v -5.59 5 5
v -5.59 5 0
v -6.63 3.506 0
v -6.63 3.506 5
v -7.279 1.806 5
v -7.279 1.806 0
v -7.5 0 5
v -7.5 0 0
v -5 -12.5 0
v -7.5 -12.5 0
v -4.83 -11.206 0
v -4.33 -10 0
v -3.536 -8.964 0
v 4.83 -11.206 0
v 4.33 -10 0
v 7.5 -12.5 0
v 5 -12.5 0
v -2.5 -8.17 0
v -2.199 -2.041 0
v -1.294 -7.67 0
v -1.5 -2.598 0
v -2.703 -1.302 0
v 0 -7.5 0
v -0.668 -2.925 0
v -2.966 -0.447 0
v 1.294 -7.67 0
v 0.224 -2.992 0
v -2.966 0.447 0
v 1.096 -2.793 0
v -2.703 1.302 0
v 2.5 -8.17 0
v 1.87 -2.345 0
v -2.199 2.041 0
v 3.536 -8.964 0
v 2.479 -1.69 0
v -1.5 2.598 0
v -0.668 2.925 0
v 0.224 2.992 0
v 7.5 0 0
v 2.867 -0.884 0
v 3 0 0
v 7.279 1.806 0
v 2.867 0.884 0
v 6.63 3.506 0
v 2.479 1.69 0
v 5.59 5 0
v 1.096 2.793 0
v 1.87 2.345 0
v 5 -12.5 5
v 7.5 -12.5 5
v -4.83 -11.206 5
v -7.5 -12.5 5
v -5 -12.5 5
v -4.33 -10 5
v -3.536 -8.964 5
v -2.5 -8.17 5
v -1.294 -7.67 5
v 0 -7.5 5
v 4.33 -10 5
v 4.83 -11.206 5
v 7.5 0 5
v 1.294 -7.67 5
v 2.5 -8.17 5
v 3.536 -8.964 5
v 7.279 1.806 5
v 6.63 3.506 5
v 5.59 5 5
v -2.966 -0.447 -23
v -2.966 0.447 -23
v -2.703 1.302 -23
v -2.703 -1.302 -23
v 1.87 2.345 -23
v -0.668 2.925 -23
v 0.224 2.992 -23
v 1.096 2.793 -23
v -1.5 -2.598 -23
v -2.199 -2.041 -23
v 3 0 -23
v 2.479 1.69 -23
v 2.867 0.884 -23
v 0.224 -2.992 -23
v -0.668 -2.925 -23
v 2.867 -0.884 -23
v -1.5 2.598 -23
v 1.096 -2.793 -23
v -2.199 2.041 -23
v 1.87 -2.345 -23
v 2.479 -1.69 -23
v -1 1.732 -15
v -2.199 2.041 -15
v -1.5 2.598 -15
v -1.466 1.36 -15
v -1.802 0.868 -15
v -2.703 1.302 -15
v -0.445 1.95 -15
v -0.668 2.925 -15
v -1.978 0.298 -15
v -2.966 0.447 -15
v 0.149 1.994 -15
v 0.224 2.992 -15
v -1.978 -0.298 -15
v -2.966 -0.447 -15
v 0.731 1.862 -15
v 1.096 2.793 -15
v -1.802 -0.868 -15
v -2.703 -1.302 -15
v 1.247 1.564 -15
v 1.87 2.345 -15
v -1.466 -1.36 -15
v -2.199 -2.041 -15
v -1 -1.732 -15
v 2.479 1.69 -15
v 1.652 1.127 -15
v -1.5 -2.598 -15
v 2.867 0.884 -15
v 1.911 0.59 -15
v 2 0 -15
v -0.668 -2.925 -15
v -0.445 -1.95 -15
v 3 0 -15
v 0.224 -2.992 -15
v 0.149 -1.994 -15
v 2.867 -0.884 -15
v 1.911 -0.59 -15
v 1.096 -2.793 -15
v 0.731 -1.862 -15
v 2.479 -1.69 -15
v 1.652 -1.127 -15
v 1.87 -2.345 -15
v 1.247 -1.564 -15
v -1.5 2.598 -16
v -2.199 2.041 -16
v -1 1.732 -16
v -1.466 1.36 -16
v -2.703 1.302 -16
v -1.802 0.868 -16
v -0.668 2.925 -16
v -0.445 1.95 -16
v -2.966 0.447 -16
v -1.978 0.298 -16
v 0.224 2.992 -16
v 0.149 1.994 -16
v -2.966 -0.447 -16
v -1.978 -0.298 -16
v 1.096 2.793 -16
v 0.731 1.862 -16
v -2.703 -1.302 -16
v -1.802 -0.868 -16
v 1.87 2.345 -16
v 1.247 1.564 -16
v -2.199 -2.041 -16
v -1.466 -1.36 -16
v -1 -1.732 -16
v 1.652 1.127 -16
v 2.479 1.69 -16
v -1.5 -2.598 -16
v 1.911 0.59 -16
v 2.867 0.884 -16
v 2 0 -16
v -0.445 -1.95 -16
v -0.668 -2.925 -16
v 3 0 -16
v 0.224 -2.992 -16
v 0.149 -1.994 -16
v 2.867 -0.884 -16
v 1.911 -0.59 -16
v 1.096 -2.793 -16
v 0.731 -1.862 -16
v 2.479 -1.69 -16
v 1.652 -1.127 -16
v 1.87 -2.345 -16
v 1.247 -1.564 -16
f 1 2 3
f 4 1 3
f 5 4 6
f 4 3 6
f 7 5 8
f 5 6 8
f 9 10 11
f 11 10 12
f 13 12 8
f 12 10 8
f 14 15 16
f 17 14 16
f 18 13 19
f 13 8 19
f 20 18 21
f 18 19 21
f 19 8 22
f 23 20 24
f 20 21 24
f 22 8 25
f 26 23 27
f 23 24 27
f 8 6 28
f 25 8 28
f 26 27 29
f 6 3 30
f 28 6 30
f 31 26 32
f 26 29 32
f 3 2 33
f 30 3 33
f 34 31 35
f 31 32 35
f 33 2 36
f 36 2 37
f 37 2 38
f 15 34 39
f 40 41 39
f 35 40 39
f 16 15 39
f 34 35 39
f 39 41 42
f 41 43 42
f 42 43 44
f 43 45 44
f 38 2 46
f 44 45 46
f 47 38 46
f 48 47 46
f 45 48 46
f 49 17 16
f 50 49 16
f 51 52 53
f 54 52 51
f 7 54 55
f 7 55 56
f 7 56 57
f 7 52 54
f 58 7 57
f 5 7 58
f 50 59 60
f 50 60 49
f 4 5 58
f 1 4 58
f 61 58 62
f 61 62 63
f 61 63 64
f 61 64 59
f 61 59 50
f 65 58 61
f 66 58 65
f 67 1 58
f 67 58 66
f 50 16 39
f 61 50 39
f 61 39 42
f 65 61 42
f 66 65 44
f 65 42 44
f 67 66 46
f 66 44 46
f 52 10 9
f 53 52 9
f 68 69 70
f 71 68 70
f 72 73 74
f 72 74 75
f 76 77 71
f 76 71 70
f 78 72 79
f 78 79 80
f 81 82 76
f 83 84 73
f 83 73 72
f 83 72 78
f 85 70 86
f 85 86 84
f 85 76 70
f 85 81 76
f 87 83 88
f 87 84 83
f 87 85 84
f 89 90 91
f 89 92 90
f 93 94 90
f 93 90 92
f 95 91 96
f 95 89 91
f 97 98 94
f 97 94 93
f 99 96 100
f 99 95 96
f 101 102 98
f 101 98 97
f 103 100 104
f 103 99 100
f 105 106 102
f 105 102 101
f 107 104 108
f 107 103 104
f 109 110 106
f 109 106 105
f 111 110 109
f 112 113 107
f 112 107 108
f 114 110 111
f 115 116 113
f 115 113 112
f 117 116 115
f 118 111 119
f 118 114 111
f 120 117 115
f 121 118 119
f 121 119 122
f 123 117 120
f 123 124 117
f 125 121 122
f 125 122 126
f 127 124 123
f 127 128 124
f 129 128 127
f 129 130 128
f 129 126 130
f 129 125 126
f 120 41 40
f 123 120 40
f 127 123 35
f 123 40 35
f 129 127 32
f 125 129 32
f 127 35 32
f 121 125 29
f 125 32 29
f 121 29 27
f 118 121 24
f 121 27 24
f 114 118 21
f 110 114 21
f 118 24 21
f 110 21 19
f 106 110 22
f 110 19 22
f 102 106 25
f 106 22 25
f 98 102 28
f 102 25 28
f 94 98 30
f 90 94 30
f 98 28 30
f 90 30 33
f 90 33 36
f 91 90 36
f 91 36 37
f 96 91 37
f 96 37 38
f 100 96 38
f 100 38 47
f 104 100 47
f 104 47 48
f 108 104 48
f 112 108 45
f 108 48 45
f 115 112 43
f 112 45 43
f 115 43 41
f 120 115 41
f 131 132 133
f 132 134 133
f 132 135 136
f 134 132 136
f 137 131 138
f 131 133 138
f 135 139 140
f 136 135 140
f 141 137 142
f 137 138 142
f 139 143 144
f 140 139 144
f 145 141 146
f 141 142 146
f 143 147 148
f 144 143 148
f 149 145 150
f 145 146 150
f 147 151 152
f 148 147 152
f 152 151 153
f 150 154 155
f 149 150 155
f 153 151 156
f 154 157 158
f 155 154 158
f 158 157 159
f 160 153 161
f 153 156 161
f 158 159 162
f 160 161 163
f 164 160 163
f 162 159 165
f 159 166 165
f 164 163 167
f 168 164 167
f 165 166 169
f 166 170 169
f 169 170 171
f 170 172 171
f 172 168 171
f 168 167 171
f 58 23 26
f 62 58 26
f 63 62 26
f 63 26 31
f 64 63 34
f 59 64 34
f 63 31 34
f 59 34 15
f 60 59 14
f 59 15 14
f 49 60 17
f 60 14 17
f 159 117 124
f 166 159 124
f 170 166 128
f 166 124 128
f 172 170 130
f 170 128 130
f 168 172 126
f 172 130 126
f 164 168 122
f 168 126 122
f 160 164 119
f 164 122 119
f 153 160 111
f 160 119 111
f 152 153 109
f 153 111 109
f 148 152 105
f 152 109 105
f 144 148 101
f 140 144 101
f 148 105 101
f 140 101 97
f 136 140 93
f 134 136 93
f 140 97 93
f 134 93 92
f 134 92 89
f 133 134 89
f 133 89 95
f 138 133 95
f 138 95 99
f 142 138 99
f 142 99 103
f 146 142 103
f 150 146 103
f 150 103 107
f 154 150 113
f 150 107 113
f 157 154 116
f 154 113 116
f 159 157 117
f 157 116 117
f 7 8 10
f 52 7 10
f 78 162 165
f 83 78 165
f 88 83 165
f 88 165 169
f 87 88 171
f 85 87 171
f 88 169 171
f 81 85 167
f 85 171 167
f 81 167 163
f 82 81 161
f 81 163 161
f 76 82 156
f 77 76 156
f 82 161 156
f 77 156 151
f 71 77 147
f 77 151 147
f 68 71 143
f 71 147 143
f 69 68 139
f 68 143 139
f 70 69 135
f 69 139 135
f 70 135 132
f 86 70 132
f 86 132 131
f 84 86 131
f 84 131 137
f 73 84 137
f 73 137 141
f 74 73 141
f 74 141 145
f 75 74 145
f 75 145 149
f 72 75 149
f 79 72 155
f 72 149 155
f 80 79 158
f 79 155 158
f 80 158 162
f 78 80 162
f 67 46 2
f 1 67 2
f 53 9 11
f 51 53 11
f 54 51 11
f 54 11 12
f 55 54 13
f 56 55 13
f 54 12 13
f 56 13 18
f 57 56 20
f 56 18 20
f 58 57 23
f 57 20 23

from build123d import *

# Parameters (mm, degrees)
F1_DEPTH = 5
F2_R     = 3
F3_DEPTH = 15
F4_R     = 2
F5_DEPTH = 1
F6_R     = 3
F6_R_2   = 2
F7_DEPTH = 7


with BuildPart() as f1:
    # F0 (on Top) → F1 (new body)
    with BuildSketch(Plane.XY):
        with BuildLine():
            ThreePointArc((0, -7.5), (5.3033008589, -5.3033008589), (7.5, 0))
            ThreePointArc((7.5, 0), (7.0062926922, 2.6761656733), (5.5901699437, 5))
            Line((5.5901699437, 5), (-5.5901699437, 5))
            ThreePointArc((-5.5901699437, 5), (-7.0062926922, 2.6761656733), (-7.5, 0))
            ThreePointArc((-7.5, 0), (-5.3033008589, -5.3033008589), (0, -7.5))
        make_face()
        with BuildLine():
            Line((7.5, -7.5), (7.5, 0))
            ThreePointArc((7.5, 0), (5.3033008589, -5.3033008589), (0, -7.5))
            Line((0, -7.5), (7.5, -7.5))
        make_face()
        with BuildLine():
            Line((-7.5, -7.5), (0, -7.5))
            ThreePointArc((0, -7.5), (-5.3033008589, -5.3033008589), (-7.5, 0))
            Line((-7.5, 0), (-7.5, -7.5))
        make_face()
        with BuildLine():
            Line((7.5, -7.5), (0, -7.5))
            ThreePointArc((0, -7.5), (3.5355339059, -8.9644660941), (5, -12.5))
            Line((5, -12.5), (7.5, -12.5))
            Line((7.5, -12.5), (7.5, -7.5))
        make_face()
        with BuildLine():
            ThreePointArc((-5, -12.5), (-3.5355339059, -8.9644660941), (0, -7.5))
            Line((0, -7.5), (-7.5, -7.5))
            Line((-7.5, -7.5), (-7.5, -12.5))
            Line((-7.5, -12.5), (-5, -12.5))
        make_face()
    extrude(amount=F1_DEPTH)

    # F2 (on face) → F3 (join)
    with BuildSketch(Plane(origin=(0, 0, 0), x_dir=(1, 0, 0), z_dir=(0, 0, -1))):
        Circle(F2_R)
    extrude(amount=F3_DEPTH)

    # F4 (on face) → F5 (join)
    with BuildSketch(Plane(origin=(0, 0, -15), x_dir=(1, 0, 0), z_dir=(0, 0, -1))):
        Circle(F4_R)
    extrude(amount=F5_DEPTH)

    # F6 (on face) → F7 (join)
    with BuildSketch(Plane(origin=(0, 0, -16), x_dir=(1, 0, 0), z_dir=(0, 0, -1))):
        Circle(F6_R)
        Circle(F6_R_2, mode=Mode.SUBTRACT)
        Circle(F6_R_2)
    extrude(amount=F7_DEPTH)


solid = f1.part
